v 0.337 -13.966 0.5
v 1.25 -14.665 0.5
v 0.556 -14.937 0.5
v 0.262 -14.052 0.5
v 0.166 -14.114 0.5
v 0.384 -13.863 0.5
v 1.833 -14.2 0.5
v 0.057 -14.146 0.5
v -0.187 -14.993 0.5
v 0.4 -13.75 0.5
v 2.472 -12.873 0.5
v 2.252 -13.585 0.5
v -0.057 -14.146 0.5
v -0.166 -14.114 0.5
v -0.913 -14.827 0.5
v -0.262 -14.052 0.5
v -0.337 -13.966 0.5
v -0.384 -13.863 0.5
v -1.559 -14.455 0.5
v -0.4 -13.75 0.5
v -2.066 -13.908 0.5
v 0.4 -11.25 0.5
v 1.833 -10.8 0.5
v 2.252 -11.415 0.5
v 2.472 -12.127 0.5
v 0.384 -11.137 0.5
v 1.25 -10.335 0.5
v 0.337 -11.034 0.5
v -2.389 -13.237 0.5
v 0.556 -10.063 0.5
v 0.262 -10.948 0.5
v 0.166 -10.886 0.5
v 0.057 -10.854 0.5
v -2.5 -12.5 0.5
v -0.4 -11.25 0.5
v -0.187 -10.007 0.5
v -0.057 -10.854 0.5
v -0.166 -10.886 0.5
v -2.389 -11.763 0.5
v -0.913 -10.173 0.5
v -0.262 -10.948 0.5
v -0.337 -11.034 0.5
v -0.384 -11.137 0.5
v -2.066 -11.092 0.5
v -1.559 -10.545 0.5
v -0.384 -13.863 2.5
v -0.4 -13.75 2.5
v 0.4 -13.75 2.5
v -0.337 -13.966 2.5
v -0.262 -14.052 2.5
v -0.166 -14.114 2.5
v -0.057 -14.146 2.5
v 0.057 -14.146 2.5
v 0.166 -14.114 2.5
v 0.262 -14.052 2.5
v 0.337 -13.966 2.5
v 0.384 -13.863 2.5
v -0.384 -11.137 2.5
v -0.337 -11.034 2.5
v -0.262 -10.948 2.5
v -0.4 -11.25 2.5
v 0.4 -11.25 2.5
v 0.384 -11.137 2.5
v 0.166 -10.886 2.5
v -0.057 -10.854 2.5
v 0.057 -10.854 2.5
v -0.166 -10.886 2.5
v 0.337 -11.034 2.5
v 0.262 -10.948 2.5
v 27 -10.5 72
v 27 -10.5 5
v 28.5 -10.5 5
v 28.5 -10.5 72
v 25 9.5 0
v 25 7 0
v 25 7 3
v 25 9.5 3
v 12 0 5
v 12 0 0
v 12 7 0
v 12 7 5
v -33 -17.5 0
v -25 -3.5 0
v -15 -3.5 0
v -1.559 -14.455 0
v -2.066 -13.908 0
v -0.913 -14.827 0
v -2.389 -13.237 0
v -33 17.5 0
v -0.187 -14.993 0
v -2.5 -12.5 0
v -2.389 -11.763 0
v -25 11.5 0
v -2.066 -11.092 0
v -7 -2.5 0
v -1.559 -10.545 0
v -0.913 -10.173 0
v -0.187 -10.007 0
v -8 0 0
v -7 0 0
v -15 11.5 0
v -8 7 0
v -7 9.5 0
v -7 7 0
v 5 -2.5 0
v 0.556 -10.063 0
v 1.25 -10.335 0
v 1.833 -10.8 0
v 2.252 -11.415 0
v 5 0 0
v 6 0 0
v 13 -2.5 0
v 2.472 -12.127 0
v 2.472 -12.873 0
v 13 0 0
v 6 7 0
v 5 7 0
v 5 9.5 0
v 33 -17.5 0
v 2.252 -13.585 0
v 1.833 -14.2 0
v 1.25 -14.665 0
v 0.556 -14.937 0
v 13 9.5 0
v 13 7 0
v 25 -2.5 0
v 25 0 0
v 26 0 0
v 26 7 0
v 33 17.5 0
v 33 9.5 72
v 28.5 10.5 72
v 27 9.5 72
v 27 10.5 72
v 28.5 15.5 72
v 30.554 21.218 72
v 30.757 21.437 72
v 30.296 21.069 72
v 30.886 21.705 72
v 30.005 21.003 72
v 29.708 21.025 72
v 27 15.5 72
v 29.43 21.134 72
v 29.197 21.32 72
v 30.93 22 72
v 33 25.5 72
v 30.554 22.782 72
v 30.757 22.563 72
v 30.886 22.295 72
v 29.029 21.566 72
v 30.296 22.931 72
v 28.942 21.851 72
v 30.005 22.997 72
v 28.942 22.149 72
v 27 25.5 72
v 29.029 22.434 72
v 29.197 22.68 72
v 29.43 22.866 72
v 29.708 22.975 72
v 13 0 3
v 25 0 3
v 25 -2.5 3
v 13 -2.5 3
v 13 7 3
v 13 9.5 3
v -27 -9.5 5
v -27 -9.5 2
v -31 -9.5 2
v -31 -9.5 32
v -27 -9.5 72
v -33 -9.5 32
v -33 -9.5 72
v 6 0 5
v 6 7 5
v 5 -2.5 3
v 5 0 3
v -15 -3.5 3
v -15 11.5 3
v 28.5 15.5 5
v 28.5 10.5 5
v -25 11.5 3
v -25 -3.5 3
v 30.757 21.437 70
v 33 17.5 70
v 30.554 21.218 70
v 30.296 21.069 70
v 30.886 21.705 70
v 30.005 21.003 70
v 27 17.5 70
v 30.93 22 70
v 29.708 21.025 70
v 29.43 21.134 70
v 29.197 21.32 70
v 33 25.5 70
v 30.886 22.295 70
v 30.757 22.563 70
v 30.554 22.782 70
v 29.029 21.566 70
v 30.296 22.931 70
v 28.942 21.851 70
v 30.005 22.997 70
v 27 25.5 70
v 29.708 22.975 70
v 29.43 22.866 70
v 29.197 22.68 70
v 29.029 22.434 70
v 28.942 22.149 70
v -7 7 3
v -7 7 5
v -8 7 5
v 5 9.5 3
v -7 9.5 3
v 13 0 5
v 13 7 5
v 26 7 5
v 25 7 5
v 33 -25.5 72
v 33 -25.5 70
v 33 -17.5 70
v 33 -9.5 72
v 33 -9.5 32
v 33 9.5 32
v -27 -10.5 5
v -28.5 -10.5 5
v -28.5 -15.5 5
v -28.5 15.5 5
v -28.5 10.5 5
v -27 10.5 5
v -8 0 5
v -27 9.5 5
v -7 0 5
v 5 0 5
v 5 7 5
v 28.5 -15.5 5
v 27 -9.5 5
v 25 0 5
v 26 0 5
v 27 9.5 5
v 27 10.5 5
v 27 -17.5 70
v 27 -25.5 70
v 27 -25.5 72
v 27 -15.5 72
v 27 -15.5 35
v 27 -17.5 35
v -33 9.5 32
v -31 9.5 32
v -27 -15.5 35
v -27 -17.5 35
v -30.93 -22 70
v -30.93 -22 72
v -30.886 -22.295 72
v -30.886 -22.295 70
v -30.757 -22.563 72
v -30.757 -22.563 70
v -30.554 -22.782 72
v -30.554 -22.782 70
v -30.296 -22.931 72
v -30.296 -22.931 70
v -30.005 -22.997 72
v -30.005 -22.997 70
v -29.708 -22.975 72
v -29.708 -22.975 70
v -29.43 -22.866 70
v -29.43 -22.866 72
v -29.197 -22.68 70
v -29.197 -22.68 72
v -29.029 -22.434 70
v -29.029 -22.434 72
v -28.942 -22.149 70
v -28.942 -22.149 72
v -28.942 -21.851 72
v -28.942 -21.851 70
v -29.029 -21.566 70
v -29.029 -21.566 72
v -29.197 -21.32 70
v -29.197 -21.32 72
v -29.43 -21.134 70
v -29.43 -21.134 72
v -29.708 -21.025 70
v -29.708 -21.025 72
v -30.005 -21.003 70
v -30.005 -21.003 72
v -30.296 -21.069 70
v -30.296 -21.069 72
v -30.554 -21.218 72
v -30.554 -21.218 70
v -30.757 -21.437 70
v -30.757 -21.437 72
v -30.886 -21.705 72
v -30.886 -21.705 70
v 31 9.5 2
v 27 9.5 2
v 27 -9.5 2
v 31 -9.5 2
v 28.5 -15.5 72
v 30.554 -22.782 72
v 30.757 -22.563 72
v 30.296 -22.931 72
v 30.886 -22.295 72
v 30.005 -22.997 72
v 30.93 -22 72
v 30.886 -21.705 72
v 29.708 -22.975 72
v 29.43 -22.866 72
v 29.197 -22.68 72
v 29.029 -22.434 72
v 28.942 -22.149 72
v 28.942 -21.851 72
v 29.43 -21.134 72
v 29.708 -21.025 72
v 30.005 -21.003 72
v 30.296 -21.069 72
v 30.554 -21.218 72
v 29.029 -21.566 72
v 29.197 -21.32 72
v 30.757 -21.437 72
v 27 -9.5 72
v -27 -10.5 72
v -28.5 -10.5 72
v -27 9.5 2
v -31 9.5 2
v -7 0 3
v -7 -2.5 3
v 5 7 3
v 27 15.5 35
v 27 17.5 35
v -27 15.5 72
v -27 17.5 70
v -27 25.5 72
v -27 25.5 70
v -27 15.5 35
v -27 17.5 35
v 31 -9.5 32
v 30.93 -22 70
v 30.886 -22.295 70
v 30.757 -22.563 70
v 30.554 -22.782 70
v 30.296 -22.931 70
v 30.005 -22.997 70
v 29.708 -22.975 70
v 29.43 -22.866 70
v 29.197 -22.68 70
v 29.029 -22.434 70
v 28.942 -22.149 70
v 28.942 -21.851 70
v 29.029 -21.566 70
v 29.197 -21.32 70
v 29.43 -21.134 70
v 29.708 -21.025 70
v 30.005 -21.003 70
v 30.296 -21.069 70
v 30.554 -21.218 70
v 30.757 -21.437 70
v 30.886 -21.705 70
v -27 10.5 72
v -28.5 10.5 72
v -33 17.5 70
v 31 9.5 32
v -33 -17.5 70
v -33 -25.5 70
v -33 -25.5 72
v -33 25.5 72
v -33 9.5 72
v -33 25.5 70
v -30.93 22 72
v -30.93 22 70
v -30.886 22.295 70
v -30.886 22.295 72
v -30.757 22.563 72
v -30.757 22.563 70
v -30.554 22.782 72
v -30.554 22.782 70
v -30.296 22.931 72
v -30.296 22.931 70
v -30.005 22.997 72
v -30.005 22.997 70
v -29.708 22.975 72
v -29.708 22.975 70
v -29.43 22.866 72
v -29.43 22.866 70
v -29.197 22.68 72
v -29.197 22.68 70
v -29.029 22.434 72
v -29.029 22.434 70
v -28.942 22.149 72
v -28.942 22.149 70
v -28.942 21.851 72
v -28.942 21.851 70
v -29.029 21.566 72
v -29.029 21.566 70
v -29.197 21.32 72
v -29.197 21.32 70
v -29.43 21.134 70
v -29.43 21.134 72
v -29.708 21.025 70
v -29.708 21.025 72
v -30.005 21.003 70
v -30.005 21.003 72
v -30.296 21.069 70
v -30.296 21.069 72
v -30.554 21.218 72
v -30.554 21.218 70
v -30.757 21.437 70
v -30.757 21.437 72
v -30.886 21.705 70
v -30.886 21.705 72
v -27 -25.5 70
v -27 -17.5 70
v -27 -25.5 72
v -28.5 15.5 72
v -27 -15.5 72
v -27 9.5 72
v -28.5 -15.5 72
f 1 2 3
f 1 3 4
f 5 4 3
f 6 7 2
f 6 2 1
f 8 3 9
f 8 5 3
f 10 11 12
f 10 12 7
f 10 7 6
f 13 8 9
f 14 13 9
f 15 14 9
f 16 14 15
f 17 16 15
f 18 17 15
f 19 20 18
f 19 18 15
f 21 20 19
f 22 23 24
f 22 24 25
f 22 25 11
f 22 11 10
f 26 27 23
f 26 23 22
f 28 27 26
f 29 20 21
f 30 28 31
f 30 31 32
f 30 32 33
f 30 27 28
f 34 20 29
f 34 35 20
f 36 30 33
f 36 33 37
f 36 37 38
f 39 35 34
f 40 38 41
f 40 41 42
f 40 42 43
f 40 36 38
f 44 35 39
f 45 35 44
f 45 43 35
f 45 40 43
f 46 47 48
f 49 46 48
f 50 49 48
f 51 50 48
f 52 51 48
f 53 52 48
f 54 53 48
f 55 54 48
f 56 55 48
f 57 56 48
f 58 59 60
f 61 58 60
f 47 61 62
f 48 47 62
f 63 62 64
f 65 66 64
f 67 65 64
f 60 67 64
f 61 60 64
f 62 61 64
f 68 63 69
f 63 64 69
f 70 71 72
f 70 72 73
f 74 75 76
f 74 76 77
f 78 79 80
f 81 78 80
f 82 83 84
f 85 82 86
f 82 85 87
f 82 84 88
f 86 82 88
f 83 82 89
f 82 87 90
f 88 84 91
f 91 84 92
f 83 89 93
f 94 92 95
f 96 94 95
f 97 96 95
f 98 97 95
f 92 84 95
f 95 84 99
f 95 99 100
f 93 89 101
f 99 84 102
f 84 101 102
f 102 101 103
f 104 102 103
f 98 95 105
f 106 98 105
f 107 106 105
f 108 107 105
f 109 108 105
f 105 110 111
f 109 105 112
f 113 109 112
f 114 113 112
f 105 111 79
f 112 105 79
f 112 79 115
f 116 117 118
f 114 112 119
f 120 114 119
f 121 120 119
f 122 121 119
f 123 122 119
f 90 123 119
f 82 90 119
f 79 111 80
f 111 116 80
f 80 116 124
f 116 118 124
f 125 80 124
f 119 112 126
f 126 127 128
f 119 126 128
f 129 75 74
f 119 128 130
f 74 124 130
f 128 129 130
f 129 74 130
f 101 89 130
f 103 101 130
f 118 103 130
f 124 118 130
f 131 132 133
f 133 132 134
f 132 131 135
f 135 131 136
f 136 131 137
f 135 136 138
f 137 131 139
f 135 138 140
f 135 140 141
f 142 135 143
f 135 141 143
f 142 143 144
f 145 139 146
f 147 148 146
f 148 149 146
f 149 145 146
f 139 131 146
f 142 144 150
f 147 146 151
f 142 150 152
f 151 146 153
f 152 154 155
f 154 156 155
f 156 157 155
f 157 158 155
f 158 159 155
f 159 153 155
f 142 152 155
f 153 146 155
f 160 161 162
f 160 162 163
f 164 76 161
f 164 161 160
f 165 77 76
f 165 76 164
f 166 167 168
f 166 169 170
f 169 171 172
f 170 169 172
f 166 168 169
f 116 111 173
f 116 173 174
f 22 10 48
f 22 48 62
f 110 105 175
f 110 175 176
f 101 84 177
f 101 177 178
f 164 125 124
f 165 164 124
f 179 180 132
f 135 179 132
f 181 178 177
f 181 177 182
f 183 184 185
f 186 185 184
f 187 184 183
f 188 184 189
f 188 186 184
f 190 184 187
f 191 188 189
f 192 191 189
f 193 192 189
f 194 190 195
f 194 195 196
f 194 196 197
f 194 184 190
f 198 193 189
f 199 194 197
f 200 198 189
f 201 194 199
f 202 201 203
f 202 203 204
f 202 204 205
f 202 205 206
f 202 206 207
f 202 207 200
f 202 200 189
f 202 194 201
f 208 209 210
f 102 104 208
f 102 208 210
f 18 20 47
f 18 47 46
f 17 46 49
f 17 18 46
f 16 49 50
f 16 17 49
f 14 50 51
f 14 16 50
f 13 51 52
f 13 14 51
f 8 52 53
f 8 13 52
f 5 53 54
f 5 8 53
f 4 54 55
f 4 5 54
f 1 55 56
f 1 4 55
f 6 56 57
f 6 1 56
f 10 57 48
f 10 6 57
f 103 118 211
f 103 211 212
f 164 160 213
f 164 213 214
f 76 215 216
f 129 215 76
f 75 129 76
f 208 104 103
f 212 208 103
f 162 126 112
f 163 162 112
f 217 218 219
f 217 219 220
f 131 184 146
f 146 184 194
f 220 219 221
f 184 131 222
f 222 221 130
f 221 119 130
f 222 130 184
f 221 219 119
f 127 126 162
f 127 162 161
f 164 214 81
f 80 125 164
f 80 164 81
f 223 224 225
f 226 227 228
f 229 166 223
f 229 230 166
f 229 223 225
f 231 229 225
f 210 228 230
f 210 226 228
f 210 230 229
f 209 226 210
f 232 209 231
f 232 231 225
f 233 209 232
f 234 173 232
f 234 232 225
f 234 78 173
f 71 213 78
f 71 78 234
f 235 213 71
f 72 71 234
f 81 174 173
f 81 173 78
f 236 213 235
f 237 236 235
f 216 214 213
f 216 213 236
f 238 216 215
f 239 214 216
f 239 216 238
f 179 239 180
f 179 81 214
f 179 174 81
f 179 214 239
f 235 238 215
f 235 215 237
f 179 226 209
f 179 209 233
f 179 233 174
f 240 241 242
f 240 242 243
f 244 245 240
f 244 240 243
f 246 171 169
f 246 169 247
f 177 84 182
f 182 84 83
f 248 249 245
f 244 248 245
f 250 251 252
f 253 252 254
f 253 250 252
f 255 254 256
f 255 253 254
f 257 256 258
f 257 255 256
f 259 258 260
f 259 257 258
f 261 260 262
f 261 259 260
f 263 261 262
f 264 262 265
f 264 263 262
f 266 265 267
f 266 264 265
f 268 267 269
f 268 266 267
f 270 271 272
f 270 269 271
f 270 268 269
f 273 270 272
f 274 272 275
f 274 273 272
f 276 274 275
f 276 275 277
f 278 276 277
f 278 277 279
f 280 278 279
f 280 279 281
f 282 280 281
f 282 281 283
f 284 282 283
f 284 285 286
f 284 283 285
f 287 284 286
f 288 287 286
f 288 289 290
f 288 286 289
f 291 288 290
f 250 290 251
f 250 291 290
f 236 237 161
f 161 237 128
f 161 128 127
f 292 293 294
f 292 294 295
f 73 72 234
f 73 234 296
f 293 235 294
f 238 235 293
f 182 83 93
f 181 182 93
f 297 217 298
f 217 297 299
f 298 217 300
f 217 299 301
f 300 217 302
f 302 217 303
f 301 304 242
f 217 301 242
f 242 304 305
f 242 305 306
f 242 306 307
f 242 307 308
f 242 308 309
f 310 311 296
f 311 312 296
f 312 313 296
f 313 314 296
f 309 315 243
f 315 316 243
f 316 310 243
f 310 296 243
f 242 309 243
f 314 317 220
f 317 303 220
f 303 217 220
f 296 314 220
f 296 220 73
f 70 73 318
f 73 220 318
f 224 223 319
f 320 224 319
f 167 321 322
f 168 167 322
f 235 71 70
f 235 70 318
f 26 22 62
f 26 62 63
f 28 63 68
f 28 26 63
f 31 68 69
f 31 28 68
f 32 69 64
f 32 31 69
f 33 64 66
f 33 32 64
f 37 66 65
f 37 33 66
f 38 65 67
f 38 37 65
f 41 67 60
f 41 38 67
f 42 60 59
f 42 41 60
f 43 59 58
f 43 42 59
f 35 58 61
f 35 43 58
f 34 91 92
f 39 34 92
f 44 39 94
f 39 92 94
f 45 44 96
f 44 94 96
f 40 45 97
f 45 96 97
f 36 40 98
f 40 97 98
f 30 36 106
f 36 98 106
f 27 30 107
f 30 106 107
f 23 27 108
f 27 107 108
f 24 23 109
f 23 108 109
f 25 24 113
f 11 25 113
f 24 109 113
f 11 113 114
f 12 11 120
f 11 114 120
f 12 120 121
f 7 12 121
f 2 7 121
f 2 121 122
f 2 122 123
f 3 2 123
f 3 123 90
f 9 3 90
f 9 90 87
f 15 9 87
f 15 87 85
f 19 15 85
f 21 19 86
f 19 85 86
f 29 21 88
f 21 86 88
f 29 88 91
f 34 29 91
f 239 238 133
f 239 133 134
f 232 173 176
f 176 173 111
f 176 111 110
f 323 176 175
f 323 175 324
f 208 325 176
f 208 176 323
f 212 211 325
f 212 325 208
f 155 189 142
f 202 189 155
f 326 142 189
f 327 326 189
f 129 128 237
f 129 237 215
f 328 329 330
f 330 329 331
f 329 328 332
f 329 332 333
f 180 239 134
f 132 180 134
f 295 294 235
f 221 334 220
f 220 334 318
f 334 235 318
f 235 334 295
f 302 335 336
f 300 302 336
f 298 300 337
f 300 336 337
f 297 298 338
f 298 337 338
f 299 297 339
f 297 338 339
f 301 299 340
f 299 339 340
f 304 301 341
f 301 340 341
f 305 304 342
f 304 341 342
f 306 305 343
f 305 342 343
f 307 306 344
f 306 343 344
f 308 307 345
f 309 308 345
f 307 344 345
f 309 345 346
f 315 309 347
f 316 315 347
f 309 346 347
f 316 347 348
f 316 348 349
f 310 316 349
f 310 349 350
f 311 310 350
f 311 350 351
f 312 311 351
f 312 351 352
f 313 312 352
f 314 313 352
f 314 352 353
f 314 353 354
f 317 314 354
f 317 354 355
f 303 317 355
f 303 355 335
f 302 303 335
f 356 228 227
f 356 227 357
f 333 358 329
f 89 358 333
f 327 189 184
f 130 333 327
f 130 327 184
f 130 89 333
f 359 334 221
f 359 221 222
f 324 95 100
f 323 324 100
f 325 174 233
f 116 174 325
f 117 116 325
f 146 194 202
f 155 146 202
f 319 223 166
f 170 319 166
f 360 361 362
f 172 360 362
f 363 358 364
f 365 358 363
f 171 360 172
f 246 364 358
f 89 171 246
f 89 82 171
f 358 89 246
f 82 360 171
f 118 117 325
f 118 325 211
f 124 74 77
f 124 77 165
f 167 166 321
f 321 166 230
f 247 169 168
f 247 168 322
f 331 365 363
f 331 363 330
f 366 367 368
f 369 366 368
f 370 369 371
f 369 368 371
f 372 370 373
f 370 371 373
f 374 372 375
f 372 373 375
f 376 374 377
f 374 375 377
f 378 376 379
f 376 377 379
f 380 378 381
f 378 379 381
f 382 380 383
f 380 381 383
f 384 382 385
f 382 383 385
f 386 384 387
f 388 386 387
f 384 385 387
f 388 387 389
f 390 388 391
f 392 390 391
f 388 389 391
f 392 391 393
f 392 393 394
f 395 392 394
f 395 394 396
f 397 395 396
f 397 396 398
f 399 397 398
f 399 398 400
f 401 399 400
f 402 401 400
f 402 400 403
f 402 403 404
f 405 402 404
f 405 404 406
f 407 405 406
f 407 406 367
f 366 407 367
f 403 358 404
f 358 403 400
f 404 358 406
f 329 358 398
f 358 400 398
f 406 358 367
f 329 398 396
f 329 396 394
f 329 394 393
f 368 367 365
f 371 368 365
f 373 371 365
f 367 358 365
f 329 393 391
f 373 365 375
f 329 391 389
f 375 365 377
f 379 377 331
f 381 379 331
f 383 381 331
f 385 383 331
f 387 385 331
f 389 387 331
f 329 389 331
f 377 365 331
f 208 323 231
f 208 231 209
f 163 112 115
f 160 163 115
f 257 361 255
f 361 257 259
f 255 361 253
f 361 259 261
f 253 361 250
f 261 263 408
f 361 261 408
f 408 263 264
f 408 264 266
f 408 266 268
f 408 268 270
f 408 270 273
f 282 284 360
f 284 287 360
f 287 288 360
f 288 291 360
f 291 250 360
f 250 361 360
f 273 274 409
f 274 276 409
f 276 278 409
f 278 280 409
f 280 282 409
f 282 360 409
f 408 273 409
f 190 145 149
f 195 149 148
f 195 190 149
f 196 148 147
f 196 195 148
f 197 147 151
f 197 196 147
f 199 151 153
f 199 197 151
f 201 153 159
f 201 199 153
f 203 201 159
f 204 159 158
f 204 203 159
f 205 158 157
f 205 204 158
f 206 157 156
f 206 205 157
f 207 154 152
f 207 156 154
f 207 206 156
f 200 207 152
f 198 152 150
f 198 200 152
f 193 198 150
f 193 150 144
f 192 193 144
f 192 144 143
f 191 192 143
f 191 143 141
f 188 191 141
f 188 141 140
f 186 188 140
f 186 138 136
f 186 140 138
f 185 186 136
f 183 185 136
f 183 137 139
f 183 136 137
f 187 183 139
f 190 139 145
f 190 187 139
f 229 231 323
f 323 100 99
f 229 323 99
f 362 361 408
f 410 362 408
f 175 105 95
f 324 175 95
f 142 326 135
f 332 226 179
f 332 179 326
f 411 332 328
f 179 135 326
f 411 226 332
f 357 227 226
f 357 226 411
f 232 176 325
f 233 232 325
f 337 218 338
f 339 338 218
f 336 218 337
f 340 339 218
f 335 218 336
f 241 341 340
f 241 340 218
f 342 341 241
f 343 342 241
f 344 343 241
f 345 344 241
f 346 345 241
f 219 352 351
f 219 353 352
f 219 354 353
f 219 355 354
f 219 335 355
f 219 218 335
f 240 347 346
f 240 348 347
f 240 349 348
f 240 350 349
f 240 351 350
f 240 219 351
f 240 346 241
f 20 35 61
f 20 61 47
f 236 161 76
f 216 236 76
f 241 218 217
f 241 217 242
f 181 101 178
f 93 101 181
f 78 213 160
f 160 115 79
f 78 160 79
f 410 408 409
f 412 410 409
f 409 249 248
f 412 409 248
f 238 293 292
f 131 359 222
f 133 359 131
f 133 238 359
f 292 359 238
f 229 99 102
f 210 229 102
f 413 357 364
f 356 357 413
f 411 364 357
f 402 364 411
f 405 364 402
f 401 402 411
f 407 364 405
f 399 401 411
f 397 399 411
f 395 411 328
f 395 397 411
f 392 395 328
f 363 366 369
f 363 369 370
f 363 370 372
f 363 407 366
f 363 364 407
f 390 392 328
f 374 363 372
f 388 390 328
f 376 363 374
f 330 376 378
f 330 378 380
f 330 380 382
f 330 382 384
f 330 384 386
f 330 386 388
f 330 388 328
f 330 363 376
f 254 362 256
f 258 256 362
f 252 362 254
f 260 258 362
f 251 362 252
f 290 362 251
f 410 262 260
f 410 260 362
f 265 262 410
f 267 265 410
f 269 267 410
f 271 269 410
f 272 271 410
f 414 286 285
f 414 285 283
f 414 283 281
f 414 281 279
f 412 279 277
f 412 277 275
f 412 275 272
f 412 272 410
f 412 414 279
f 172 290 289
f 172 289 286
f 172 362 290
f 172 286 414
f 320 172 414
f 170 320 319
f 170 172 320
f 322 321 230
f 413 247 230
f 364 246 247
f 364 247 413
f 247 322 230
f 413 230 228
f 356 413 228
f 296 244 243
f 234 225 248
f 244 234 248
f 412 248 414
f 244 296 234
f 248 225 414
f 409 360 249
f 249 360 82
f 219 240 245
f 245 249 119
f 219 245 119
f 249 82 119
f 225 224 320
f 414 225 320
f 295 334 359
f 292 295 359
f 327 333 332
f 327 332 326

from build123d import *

# Parameters (mm, degrees)
ESQUISSE1_W               = 66
ESQUISSE1_H               = 35
BOSS_EXTRU_1_DEPTH        = 70
ESQUISSE2_W               = 54
ESQUISSE2_H               = 35
ENL_V_MAT_EXTRU_2_DEPTH   = 65
ESQUISSE4_W               = 54
ESQUISSE4_H               = 2
BOSS_EXTRU_2_DEPTH        = 30
ESQUISSE5_W               = 6
ESQUISSE5_H               = 51
BOSS_EXTRU_3_DEPTH        = 2
ESQUISSE6_R               = 1
ENL_V_MAT_EXTRU_3_DEPTH   = 10
SYM_TRIE3_COPY_1_SKETCH_R = 1
SYM_TRIE3_COPY_1_DEPTH    = 10
ESQUISSE12_R              = 2.5
ENL_V_MAT_EXTRU_5_DEPTH   = 0.5
ENL_V_MAT_EXTRU_6_DEPTH   = 2
ESQUISSE15_W              = 12
ESQUISSE15_H              = 12
ESQUISSE15_W_2            = 10
ESQUISSE15_H_2            = 15
ENL_V_MAT_EXTRU_8_DEPTH   = 3
ESQUISSE17_W              = 40
ESQUISSE17_H              = 19
ENL_V_MAT_EXTRU_10_DEPTH  = 67
ESQUISSE18_W              = 4
ESQUISSE18_H              = 19
ENL_V_MAT_EXTRU_11_DEPTH  = 30
ESQUISSE20_W              = 67
ESQUISSE20_H              = 5
ENL_V_MAT_EXTRU_13_DEPTH  = 1.5
SYM_TRIE5_COPY_1_SKETCH_W = 67
SYM_TRIE5_COPY_1_SKETCH_H = 5
SYM_TRIE5_COPY_1_DEPTH    = 1.5
ESQUISSE22_W              = 1
ESQUISSE22_H              = 7
ENL_V_MAT_EXTRU_14_DEPTH  = 73


with BuildPart() as part:
    # Esquisse1 → Boss.-Extru.1 (new body)
    with BuildSketch(Plane.XY):
        Rectangle(ESQUISSE1_W, ESQUISSE1_H)
    extrude(amount=BOSS_EXTRU_1_DEPTH)

    # Esquisse2 → Enlèv. mat.-Extru.2 (cut)
    with BuildSketch(Plane.XY.offset(70)):
        Rectangle(ESQUISSE2_W, ESQUISSE2_H)
    extrude(amount=-ENL_V_MAT_EXTRU_2_DEPTH, mode=Mode.SUBTRACT)

    # Esquisse4 → Boss.-Extru.2 (add)
    with BuildSketch(Plane.XY.offset(5)):
        with Locations((0, 16.5)):
            Rectangle(ESQUISSE4_W, ESQUISSE4_H)
    boss_extru_2 = extrude(amount=BOSS_EXTRU_2_DEPTH)

    # Symétrie1: Boss.-Extru.2 across plane
    add(boss_extru_2.mirror(Plane.ZX))

    # Esquisse5 → Boss.-Extru.3 (add)
    with BuildSketch(Plane.XY.offset(70)):
        with Locations((-30, 0)):
            Rectangle(ESQUISSE5_W, ESQUISSE5_H)
    boss_extru_3 = extrude(amount=BOSS_EXTRU_3_DEPTH)

    # Esquisse6 → Enlèv. mat.-Extru.3 (cut)
    with BuildSketch(Plane(origin=(0, 0, 70), x_dir=(-1, 0, 0), z_dir=(0, 0, -1))):
        with Locations((29.930394318, 22)):
            Circle(ESQUISSE6_R)
    enl_v_mat_extru_3 = extrude(amount=-ENL_V_MAT_EXTRU_3_DEPTH, mode=Mode.SUBTRACT)

    # Symétrie2: Enlèv. mat.-Extru.3 across plane
    add(enl_v_mat_extru_3.mirror(Plane.ZX), mode=Mode.SUBTRACT)

    # Symétrie3: Boss.-Extru.3, Enlèv. mat.-Extru.3 across plane
    add(boss_extru_3.mirror(Plane(origin=(0, 0, 0), x_dir=(0, 0, 1), z_dir=(1, 0, 0))))
    add(enl_v_mat_extru_3.mirror(Plane(origin=(0, 0, 0), x_dir=(0, 0, 1), z_dir=(1, 0, 0))), mode=Mode.SUBTRACT)

    # Symétrie3 copy 1 sketch → Symétrie3 copy 1 (cut)
    with BuildSketch(Plane(origin=(0, 0, 70), x_dir=(1, 0, 0), z_dir=(0, 0, -1))):
        with Locations((29.930394318, 22)):
            Circle(SYM_TRIE3_COPY_1_SKETCH_R)
    extrude(amount=-SYM_TRIE3_COPY_1_DEPTH, mode=Mode.SUBTRACT)

    # Esquisse12 → Enlèv. mat.-Extru.5 (cut)
    with BuildSketch(Plane(origin=(0, 0, 0), x_dir=(-1, 0, 0), z_dir=(0, 0, -1))):
        with Locations((0, -12.5)):
            Circle(ESQUISSE12_R)
    extrude(amount=-ENL_V_MAT_EXTRU_5_DEPTH, mode=Mode.SUBTRACT)

    # Esquisse14 → Enlèv. mat.-Extru.6 (cut)
    with BuildSketch(Plane(origin=(0, 0, 0.5), x_dir=(-1, 0, 0), z_dir=(0, 0, -1))):
        with BuildLine():
            Line((0.4, -11.25), (0.4, -13.75))
            ThreePointArc((0.4, -13.75), (0, -14.15), (-0.4, -13.75))
            Line((-0.4, -13.75), (-0.4, -11.25))
            ThreePointArc((-0.4, -11.25), (0, -10.85), (0.4, -11.25))
        make_face()
    extrude(amount=-ENL_V_MAT_EXTRU_6_DEPTH, mode=Mode.SUBTRACT)

    # Esquisse15 → Enlèv. mat.-Extru.8 (cut)
    with BuildSketch(Plane(origin=(0, 0, 0), x_dir=(-1, 0, 0), z_dir=(0, 0, -1))):
        with Locations((1, 3.5)):
            Rectangle(ESQUISSE15_W, ESQUISSE15_H)
        with Locations((-19, 3.5)):
            Rectangle(ESQUISSE15_W, ESQUISSE15_H)
        with Locations((20, 4)):
            Rectangle(ESQUISSE15_W_2, ESQUISSE15_H_2)
    extrude(amount=-ENL_V_MAT_EXTRU_8_DEPTH, mode=Mode.SUBTRACT)

    # Esquisse17 → Enlèv. mat.-Extru.10 (cut, through all)
    with BuildSketch(Plane.ZY.offset(33)):
        with Locations((52, 0)):
            Rectangle(ESQUISSE17_W, ESQUISSE17_H)
    extrude(amount=-ENL_V_MAT_EXTRU_10_DEPTH, mode=Mode.SUBTRACT)

    # Esquisse18 → Enlèv. mat.-Extru.11 (cut)
    with BuildSketch(Plane.XY.offset(32)):
        with Locations((29, 0)):
            Rectangle(ESQUISSE18_W, ESQUISSE18_H)
    enl_v_mat_extru_11 = extrude(amount=-ENL_V_MAT_EXTRU_11_DEPTH, mode=Mode.SUBTRACT)

    # Esquisse20 → Enlèv. mat.-Extru.13 (cut)
    with BuildSketch(Plane.ZY.offset(-27)):
        with Locations((38.5, -13)):
            Rectangle(ESQUISSE20_W, ESQUISSE20_H)
    enl_v_mat_extru_13 = extrude(amount=-ENL_V_MAT_EXTRU_13_DEPTH, mode=Mode.SUBTRACT)

    # Symétrie4: Enlèv. mat.-Extru.13 across plane
    add(enl_v_mat_extru_13.mirror(Plane.ZX), mode=Mode.SUBTRACT)

    # Symétrie5: Enlèv. mat.-Extru.13, Enlèv. mat.-Extru.11 across plane
    add(enl_v_mat_extru_13.mirror(Plane(origin=(0, 0, 0), x_dir=(0, 0, 1), z_dir=(1, 0, 0))), mode=Mode.SUBTRACT)
    add(enl_v_mat_extru_11.mirror(Plane(origin=(0, 0, 0), x_dir=(0, 0, 1), z_dir=(1, 0, 0))), mode=Mode.SUBTRACT)

    # Symétrie5 copy 1 sketch → Symétrie5 copy 1 (cut)
    with BuildSketch(Plane(origin=(-27, 0, 0), x_dir=(0, 0, 1), z_dir=(1, 0, 0))):
        with Locations((38.5, -13)):
            Rectangle(SYM_TRIE5_COPY_1_SKETCH_W, SYM_TRIE5_COPY_1_SKETCH_H)
    extrude(amount=-SYM_TRIE5_COPY_1_DEPTH, mode=Mode.SUBTRACT)

    # Esquisse22 → Enlèv. mat.-Extru.14 (cut, through all)
    with BuildSketch(Plane(origin=(0, 0, 0), x_dir=(-1, 0, 0), z_dir=(0, 0, -1))):
        with Locations((-12.5, 3.5)):
            Rectangle(ESQUISSE22_W, ESQUISSE22_H)
        with Locations((-25.5, 3.5)):
            Rectangle(ESQUISSE22_W, ESQUISSE22_H)
        with Locations((-5.5, 3.5)):
            Rectangle(ESQUISSE22_W, ESQUISSE22_H)
        with Locations((7.5, 3.5)):
            Rectangle(ESQUISSE22_W, ESQUISSE22_H)
    extrude(amount=-ENL_V_MAT_EXTRU_14_DEPTH, mode=Mode.SUBTRACT)


solid = part.part
